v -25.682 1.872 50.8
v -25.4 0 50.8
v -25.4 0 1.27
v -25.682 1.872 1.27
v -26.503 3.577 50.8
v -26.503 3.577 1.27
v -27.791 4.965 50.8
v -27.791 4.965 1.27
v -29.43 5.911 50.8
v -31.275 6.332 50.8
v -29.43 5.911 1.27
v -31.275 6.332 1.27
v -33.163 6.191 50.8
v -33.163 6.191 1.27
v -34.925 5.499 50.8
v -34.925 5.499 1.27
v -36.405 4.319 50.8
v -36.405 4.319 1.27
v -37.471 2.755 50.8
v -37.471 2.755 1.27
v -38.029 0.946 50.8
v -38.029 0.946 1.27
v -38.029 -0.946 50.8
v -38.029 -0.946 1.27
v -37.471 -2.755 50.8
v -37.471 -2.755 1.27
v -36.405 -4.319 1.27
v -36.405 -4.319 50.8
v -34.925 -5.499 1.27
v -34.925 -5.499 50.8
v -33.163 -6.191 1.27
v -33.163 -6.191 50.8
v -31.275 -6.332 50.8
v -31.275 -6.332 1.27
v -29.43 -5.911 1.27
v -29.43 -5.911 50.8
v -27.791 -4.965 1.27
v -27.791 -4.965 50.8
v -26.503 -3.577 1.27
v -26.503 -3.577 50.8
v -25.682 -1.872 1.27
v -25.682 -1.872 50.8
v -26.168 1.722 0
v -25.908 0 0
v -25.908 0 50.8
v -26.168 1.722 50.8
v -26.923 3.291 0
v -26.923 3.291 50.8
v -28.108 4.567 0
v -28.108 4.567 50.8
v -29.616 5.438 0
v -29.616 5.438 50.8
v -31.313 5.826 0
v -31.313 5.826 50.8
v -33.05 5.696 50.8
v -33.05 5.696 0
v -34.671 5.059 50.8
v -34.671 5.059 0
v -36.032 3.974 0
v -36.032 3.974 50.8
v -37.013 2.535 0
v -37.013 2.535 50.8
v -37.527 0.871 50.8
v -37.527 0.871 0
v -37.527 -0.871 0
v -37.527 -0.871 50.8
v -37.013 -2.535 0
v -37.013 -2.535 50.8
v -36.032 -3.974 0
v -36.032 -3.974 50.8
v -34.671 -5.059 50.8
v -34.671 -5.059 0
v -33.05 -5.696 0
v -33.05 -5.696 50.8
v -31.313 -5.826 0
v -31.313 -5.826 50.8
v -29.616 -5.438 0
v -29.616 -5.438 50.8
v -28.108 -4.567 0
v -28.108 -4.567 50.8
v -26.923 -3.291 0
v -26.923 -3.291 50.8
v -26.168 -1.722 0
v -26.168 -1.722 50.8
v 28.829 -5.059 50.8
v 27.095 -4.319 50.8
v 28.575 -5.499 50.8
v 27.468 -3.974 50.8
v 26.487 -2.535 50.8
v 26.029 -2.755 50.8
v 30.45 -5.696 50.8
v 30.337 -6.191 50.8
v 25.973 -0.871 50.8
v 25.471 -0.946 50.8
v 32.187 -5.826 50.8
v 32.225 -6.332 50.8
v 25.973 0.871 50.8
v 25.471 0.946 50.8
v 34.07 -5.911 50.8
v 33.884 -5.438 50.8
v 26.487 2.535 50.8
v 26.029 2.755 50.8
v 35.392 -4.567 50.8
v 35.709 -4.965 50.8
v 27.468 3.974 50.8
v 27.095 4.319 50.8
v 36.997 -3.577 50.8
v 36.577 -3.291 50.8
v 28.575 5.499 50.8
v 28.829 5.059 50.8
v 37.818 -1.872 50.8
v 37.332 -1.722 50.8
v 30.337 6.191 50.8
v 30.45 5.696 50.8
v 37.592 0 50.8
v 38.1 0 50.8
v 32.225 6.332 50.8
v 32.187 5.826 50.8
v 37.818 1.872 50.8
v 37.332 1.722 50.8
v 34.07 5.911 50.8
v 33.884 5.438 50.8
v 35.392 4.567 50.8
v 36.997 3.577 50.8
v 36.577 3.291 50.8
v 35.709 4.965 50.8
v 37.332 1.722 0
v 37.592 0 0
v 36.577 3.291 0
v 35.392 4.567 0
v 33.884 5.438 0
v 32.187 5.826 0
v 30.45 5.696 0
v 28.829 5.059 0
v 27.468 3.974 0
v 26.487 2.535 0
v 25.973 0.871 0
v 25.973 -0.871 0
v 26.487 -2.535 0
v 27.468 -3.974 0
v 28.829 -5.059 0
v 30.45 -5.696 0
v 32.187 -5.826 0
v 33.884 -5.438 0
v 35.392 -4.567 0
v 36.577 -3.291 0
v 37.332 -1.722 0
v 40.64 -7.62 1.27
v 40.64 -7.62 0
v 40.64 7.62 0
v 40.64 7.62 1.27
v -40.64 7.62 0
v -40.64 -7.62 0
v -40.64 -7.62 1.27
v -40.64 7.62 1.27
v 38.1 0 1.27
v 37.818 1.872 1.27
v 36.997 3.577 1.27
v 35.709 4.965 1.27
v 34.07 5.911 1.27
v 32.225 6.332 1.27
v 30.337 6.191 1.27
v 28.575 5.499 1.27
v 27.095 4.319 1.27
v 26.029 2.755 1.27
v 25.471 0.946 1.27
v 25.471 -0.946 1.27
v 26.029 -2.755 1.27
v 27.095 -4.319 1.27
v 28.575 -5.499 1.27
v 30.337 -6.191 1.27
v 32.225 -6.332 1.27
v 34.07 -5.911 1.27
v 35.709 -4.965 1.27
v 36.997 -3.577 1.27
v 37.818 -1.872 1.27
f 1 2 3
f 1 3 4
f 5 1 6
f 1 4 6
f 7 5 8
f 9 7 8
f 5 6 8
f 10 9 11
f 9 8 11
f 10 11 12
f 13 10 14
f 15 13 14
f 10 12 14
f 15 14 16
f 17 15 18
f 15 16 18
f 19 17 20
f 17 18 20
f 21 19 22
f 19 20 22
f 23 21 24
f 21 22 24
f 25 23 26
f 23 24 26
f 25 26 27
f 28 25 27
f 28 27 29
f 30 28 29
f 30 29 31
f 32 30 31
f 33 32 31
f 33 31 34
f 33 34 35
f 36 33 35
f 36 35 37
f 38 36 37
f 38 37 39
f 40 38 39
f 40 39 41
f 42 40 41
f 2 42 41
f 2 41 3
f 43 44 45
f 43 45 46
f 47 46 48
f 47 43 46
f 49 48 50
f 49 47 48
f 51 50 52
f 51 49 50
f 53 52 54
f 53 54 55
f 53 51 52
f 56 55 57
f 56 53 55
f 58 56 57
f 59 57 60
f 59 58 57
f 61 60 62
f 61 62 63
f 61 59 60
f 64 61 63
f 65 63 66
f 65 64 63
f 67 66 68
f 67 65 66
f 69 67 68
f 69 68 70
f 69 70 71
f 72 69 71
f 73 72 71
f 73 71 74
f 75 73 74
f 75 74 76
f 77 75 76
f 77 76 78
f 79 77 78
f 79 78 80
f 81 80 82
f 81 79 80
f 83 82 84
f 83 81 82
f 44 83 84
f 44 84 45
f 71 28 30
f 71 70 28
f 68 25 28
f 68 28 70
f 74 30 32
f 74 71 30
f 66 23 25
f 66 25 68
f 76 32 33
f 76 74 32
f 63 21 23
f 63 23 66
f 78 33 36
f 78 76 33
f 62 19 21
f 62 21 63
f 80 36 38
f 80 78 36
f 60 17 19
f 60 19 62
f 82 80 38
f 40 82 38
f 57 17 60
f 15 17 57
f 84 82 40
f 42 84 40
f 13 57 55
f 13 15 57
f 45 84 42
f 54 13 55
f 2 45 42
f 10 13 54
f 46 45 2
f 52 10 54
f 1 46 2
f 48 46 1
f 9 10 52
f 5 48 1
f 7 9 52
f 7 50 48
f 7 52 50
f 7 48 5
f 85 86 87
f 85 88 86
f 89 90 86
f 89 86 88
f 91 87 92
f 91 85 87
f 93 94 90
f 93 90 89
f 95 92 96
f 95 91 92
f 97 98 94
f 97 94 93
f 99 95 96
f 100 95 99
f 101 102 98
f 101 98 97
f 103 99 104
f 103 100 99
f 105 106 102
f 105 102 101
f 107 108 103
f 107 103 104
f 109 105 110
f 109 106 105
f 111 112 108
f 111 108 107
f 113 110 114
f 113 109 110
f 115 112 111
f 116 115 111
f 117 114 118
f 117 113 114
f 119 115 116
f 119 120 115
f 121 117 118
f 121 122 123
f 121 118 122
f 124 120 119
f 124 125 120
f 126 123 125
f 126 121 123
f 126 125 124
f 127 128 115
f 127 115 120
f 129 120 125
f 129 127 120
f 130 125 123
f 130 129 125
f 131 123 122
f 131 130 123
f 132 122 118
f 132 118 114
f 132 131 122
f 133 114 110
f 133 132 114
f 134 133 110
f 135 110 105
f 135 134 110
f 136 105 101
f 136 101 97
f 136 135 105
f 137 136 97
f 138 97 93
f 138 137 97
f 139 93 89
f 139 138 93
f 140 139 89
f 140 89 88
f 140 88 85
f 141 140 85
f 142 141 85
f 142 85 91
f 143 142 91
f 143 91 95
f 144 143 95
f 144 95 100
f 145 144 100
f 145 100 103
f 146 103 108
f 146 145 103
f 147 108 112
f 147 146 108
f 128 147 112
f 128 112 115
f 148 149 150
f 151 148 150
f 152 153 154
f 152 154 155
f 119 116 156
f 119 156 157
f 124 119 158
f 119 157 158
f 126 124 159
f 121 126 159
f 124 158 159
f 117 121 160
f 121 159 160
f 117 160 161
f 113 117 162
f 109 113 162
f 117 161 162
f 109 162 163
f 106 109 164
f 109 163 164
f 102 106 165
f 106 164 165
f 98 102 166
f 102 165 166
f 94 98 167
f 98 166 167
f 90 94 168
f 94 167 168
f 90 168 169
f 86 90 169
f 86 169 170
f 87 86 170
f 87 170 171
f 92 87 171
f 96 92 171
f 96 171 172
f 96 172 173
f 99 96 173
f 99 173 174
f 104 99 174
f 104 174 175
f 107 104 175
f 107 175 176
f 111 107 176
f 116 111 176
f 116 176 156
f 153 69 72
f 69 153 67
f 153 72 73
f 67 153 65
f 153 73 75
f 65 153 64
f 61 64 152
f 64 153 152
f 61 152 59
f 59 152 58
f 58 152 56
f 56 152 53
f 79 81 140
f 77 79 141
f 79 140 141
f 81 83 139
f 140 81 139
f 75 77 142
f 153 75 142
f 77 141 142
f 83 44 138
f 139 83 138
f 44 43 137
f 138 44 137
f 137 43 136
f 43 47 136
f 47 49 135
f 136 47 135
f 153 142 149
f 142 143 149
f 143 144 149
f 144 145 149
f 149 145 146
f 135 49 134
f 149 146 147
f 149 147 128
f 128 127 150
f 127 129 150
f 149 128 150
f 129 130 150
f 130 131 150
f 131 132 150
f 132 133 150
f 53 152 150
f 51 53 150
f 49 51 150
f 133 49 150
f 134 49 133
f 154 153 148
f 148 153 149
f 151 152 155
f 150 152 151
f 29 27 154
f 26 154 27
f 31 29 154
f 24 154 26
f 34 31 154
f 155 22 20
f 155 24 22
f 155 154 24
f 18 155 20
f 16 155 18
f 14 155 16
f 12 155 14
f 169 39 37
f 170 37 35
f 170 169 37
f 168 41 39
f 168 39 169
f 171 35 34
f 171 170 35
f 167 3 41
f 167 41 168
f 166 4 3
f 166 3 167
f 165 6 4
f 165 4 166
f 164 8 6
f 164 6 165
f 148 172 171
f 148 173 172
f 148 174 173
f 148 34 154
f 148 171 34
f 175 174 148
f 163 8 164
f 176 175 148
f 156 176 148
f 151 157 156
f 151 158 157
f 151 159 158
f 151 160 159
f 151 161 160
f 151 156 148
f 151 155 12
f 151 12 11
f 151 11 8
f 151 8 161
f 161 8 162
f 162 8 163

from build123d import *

# Parameters (mm, degrees)
F0_R     = 6.35
F0_R_2   = 5.842
F1_DEPTH = 50.8
F0_W     = 81.28
F0_H     = 15.24
F2_DEPTH = 1.27


with BuildPart() as f1:
    # F0 (on Top) → F1 (new body)
    with BuildSketch(Plane.XY):
        with Locations((-31.75, 0)):
            Circle(F0_R)
        with Locations((-31.75, 0)):
            Circle(F0_R_2, mode=Mode.SUBTRACT)
    extrude(amount=F1_DEPTH)



with BuildPart() as f1b:
    # F0 (on Top) → F1, piece 2 (new body)
    with BuildSketch(Plane.XY):
        with Locations((31.75, 0)):
            Circle(F0_R)
        with Locations((31.75, 0)):
            Circle(F0_R_2, mode=Mode.SUBTRACT)
    extrude(amount=F1_DEPTH)


with BuildPart() as f1_1:
    add(f1.part)

    add(f1b.part)  # F2 merges F1b
    # F0 (on Top) → F2 (join)
    with BuildSketch(Plane.XY):
        Rectangle(F0_W, F0_H)
        with Locations((-31.75, 0)):
            Circle(F0_R, mode=Mode.SUBTRACT)
        with Locations((31.75, 0)):
            Circle(F0_R, mode=Mode.SUBTRACT)
    extrude(amount=F2_DEPTH)


solid = f1_1.part
